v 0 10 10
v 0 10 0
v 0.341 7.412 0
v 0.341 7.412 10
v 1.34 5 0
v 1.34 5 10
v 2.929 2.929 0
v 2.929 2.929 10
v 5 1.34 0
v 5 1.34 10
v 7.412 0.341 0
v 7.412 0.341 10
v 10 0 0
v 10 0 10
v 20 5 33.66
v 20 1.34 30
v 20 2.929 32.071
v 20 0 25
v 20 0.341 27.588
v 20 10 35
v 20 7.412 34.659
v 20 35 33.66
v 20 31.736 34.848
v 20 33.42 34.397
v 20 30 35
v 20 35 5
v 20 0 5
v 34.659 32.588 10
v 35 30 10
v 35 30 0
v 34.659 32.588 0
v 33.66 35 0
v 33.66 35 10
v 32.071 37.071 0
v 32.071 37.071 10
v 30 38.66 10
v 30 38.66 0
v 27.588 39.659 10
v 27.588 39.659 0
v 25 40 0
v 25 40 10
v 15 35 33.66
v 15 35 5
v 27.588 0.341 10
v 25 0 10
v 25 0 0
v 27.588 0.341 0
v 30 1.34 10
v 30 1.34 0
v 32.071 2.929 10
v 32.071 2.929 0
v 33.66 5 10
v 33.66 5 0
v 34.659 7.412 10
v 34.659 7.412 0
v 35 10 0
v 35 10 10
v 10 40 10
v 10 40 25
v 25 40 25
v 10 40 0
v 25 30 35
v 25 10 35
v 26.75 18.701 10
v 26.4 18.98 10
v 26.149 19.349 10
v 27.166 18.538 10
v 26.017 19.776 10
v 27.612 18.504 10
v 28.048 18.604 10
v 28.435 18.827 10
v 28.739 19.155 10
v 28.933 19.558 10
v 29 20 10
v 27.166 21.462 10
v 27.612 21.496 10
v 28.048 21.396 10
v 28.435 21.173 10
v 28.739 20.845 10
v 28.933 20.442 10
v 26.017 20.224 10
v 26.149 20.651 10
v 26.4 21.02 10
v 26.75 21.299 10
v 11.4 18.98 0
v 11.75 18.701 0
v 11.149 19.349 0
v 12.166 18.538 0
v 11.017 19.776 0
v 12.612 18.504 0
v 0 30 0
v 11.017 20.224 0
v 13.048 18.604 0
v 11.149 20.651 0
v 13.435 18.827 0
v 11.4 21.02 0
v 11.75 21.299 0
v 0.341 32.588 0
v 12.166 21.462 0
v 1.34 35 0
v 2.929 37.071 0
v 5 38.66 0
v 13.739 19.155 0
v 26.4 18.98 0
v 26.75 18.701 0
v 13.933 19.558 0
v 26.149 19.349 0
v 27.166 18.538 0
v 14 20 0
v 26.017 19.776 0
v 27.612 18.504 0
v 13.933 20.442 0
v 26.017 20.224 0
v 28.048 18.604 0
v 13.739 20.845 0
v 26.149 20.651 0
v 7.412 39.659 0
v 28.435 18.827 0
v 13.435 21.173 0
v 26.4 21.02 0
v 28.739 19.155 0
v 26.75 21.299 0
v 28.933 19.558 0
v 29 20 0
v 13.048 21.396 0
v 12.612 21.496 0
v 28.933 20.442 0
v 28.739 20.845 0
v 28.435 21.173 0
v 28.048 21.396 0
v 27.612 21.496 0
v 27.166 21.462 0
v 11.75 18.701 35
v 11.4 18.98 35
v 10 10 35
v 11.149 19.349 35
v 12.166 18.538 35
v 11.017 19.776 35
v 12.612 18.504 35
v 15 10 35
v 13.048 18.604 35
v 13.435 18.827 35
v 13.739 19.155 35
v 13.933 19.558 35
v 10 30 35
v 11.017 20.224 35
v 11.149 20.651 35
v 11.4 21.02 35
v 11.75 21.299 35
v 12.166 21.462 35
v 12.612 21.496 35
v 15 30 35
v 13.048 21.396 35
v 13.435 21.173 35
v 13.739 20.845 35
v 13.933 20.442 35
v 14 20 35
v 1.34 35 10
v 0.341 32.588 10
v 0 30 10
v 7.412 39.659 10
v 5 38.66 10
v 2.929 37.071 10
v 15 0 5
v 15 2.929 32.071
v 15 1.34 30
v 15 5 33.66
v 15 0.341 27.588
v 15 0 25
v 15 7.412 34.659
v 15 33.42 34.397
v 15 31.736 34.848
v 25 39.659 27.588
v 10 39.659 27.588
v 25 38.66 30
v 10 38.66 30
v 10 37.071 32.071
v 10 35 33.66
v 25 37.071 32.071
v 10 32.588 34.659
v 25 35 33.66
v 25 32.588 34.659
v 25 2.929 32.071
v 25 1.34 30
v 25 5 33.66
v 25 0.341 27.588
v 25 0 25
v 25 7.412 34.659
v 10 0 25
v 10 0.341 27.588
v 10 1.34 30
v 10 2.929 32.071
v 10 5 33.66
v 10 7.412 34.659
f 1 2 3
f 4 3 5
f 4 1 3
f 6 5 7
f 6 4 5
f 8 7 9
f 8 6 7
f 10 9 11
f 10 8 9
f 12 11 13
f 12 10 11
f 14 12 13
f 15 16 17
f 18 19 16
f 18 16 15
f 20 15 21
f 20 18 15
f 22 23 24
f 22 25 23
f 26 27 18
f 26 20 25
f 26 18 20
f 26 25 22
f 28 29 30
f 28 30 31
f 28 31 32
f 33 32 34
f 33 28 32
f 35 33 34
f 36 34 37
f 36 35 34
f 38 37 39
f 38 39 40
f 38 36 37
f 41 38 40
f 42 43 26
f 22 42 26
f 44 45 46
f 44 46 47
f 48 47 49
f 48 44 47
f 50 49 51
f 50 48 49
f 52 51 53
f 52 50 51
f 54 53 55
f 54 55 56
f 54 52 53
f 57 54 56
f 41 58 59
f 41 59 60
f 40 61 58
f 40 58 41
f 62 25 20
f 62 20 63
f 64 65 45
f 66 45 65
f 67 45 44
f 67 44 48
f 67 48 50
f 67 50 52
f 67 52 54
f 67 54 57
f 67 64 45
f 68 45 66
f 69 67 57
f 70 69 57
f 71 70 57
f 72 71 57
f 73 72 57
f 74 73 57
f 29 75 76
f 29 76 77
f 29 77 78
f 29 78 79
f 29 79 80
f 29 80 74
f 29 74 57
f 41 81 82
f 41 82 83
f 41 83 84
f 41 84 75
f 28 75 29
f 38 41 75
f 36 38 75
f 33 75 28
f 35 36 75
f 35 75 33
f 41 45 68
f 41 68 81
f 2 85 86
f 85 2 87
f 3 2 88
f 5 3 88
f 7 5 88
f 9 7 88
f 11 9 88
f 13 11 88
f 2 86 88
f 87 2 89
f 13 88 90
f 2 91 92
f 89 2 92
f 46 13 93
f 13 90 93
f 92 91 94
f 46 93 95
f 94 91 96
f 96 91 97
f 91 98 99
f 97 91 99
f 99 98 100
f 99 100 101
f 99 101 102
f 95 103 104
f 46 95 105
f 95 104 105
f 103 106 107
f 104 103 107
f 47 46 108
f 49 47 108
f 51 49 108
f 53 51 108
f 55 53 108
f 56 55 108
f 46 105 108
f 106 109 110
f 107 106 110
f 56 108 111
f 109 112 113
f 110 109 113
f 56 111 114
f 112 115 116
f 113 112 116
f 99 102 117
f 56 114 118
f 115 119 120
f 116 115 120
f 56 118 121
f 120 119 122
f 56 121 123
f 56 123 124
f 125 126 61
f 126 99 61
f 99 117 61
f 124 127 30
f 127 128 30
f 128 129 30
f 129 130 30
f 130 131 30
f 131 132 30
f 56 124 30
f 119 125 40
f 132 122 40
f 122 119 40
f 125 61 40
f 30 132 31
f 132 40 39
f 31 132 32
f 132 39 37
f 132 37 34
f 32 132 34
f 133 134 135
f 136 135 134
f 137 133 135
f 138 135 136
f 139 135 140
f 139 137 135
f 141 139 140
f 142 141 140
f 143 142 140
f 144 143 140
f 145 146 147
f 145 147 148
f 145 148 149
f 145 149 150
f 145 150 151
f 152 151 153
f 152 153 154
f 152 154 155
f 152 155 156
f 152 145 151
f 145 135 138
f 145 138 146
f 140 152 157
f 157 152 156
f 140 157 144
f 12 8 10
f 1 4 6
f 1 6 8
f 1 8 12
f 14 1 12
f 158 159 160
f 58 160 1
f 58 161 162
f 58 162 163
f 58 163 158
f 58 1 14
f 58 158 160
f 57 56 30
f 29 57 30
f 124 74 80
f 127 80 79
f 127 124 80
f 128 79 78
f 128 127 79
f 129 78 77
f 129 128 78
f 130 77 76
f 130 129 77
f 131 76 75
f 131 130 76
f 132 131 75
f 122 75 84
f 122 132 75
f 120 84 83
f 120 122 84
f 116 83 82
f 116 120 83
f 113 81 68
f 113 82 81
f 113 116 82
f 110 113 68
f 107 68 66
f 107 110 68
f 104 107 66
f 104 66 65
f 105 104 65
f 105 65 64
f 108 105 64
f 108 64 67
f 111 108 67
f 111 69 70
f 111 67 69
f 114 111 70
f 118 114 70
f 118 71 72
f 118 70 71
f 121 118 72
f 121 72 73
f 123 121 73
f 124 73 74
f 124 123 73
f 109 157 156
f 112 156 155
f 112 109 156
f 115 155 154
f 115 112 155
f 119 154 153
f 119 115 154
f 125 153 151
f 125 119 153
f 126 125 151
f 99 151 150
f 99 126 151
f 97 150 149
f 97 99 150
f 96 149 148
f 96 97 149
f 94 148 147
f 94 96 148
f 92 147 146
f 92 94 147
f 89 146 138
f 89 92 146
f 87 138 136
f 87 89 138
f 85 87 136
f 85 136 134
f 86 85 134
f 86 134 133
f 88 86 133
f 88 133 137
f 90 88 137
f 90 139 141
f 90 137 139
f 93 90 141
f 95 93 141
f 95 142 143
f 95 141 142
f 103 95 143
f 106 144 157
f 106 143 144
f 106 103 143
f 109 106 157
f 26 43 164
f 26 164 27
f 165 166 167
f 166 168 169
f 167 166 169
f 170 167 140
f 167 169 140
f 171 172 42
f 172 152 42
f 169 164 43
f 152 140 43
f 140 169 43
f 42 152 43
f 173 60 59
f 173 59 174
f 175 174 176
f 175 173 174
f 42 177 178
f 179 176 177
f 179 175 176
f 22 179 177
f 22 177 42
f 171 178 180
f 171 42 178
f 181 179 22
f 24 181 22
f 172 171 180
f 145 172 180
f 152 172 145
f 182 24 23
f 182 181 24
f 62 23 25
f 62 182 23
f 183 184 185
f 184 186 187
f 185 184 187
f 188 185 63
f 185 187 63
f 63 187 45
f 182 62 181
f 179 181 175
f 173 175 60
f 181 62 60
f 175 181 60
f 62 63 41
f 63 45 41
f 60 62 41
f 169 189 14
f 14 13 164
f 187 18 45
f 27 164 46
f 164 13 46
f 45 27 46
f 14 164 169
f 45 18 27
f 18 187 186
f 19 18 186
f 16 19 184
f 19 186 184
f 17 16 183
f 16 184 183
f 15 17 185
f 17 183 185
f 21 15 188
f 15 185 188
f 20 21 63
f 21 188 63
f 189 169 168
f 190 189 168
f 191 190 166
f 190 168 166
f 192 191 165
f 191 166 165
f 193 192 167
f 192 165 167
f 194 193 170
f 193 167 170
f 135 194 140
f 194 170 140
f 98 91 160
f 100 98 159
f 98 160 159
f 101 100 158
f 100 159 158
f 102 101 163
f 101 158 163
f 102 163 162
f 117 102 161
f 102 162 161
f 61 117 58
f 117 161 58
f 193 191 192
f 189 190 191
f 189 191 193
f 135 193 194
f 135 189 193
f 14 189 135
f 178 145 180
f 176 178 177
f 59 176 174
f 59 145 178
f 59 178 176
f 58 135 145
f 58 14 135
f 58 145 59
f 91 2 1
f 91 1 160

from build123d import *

# Parameters (mm, degrees)
CYLINDER001_R     = 1.5
CYLINDER001_DEPTH = 40
CYLINDER_R        = 1.5
CYLINDER_DEPTH    = 40
BOX003_W          = 10
BOX003_H          = 40
BOX003_DEPTH      = 25
BOX002_W          = 5
BOX002_H          = 35
BOX002_DEPTH      = 35
BOX001_W          = 10
BOX001_H          = 40
BOX001_DEPTH      = 25
BOX_W             = 35
BOX_H             = 40
BOX_DEPTH         = 35
FILLET_R          = 10


with BuildPart() as cylinder001:
    # Cylinder001 → Cylinder001 (new body)
    with BuildSketch(Plane(origin=(27.5, 20, 0), x_dir=(1, 0, 0), z_dir=(0, 0, 1))):
        Circle(CYLINDER001_R)
    extrude(amount=CYLINDER001_DEPTH)


with BuildPart() as cylinder:
    # Cylinder → Cylinder (new body)
    with BuildSketch(Plane(origin=(12.5, 20, 0), x_dir=(1, 0, 0), z_dir=(0, 0, 1))):
        Circle(CYLINDER_R)
    extrude(amount=CYLINDER_DEPTH)


with BuildPart() as cube003:
    # Box003 → Box003 (new body)
    with BuildSketch(Plane(origin=(25, 0, 10), x_dir=(1, 0, 0), z_dir=(0, 0, 1))):
        with Locations((5, 20)):
            Rectangle(BOX003_W, BOX003_H)
    extrude(amount=BOX003_DEPTH)


with BuildPart() as cube002:
    # Box002 → Box002 (new body)
    with BuildSketch(Plane(origin=(15, 0, 5), x_dir=(1, 0, 0), z_dir=(0, 0, 1))):
        with Locations((2.5, 17.5)):
            Rectangle(BOX002_W, BOX002_H)
    extrude(amount=BOX002_DEPTH)


with BuildPart() as cube001:
    # Box001 → Box001 (new body)
    with BuildSketch(Plane.XY.offset(10)):
        with Locations((5, 20)):
            Rectangle(BOX001_W, BOX001_H)
    extrude(amount=BOX001_DEPTH)


with BuildPart() as cut004:
    # Box → Box (new body)
    with BuildSketch(Plane.XY):
        with Locations((17.5, 20)):
            Rectangle(BOX_W, BOX_H)
    extrude(amount=BOX_DEPTH)

    # Fillet
    fillet_edges = [cut004.edges().sort_by_distance(p)[0] for p in [
        (0, 0, 17.5),
        (0, 40, 17.5),
        (35, 0, 17.5),
        (35, 40, 17.5),
        (17.5, 0, 35),
        (17.5, 40, 35),
    ]]
    fillet(fillet_edges, radius=FILLET_R)

    # Cut: cut Cube001
    add(cube001.part, mode=Mode.SUBTRACT)

    # Cut001: cut Cube002
    add(cube002.part, mode=Mode.SUBTRACT)

    # Cut002: cut Cube003
    add(cube003.part, mode=Mode.SUBTRACT)

    # Cut003: cut Cylinder
    add(cylinder.part, mode=Mode.SUBTRACT)

    # Cut004: cut Cylinder001
    add(cylinder001.part, mode=Mode.SUBTRACT)


solid = cut004.part
